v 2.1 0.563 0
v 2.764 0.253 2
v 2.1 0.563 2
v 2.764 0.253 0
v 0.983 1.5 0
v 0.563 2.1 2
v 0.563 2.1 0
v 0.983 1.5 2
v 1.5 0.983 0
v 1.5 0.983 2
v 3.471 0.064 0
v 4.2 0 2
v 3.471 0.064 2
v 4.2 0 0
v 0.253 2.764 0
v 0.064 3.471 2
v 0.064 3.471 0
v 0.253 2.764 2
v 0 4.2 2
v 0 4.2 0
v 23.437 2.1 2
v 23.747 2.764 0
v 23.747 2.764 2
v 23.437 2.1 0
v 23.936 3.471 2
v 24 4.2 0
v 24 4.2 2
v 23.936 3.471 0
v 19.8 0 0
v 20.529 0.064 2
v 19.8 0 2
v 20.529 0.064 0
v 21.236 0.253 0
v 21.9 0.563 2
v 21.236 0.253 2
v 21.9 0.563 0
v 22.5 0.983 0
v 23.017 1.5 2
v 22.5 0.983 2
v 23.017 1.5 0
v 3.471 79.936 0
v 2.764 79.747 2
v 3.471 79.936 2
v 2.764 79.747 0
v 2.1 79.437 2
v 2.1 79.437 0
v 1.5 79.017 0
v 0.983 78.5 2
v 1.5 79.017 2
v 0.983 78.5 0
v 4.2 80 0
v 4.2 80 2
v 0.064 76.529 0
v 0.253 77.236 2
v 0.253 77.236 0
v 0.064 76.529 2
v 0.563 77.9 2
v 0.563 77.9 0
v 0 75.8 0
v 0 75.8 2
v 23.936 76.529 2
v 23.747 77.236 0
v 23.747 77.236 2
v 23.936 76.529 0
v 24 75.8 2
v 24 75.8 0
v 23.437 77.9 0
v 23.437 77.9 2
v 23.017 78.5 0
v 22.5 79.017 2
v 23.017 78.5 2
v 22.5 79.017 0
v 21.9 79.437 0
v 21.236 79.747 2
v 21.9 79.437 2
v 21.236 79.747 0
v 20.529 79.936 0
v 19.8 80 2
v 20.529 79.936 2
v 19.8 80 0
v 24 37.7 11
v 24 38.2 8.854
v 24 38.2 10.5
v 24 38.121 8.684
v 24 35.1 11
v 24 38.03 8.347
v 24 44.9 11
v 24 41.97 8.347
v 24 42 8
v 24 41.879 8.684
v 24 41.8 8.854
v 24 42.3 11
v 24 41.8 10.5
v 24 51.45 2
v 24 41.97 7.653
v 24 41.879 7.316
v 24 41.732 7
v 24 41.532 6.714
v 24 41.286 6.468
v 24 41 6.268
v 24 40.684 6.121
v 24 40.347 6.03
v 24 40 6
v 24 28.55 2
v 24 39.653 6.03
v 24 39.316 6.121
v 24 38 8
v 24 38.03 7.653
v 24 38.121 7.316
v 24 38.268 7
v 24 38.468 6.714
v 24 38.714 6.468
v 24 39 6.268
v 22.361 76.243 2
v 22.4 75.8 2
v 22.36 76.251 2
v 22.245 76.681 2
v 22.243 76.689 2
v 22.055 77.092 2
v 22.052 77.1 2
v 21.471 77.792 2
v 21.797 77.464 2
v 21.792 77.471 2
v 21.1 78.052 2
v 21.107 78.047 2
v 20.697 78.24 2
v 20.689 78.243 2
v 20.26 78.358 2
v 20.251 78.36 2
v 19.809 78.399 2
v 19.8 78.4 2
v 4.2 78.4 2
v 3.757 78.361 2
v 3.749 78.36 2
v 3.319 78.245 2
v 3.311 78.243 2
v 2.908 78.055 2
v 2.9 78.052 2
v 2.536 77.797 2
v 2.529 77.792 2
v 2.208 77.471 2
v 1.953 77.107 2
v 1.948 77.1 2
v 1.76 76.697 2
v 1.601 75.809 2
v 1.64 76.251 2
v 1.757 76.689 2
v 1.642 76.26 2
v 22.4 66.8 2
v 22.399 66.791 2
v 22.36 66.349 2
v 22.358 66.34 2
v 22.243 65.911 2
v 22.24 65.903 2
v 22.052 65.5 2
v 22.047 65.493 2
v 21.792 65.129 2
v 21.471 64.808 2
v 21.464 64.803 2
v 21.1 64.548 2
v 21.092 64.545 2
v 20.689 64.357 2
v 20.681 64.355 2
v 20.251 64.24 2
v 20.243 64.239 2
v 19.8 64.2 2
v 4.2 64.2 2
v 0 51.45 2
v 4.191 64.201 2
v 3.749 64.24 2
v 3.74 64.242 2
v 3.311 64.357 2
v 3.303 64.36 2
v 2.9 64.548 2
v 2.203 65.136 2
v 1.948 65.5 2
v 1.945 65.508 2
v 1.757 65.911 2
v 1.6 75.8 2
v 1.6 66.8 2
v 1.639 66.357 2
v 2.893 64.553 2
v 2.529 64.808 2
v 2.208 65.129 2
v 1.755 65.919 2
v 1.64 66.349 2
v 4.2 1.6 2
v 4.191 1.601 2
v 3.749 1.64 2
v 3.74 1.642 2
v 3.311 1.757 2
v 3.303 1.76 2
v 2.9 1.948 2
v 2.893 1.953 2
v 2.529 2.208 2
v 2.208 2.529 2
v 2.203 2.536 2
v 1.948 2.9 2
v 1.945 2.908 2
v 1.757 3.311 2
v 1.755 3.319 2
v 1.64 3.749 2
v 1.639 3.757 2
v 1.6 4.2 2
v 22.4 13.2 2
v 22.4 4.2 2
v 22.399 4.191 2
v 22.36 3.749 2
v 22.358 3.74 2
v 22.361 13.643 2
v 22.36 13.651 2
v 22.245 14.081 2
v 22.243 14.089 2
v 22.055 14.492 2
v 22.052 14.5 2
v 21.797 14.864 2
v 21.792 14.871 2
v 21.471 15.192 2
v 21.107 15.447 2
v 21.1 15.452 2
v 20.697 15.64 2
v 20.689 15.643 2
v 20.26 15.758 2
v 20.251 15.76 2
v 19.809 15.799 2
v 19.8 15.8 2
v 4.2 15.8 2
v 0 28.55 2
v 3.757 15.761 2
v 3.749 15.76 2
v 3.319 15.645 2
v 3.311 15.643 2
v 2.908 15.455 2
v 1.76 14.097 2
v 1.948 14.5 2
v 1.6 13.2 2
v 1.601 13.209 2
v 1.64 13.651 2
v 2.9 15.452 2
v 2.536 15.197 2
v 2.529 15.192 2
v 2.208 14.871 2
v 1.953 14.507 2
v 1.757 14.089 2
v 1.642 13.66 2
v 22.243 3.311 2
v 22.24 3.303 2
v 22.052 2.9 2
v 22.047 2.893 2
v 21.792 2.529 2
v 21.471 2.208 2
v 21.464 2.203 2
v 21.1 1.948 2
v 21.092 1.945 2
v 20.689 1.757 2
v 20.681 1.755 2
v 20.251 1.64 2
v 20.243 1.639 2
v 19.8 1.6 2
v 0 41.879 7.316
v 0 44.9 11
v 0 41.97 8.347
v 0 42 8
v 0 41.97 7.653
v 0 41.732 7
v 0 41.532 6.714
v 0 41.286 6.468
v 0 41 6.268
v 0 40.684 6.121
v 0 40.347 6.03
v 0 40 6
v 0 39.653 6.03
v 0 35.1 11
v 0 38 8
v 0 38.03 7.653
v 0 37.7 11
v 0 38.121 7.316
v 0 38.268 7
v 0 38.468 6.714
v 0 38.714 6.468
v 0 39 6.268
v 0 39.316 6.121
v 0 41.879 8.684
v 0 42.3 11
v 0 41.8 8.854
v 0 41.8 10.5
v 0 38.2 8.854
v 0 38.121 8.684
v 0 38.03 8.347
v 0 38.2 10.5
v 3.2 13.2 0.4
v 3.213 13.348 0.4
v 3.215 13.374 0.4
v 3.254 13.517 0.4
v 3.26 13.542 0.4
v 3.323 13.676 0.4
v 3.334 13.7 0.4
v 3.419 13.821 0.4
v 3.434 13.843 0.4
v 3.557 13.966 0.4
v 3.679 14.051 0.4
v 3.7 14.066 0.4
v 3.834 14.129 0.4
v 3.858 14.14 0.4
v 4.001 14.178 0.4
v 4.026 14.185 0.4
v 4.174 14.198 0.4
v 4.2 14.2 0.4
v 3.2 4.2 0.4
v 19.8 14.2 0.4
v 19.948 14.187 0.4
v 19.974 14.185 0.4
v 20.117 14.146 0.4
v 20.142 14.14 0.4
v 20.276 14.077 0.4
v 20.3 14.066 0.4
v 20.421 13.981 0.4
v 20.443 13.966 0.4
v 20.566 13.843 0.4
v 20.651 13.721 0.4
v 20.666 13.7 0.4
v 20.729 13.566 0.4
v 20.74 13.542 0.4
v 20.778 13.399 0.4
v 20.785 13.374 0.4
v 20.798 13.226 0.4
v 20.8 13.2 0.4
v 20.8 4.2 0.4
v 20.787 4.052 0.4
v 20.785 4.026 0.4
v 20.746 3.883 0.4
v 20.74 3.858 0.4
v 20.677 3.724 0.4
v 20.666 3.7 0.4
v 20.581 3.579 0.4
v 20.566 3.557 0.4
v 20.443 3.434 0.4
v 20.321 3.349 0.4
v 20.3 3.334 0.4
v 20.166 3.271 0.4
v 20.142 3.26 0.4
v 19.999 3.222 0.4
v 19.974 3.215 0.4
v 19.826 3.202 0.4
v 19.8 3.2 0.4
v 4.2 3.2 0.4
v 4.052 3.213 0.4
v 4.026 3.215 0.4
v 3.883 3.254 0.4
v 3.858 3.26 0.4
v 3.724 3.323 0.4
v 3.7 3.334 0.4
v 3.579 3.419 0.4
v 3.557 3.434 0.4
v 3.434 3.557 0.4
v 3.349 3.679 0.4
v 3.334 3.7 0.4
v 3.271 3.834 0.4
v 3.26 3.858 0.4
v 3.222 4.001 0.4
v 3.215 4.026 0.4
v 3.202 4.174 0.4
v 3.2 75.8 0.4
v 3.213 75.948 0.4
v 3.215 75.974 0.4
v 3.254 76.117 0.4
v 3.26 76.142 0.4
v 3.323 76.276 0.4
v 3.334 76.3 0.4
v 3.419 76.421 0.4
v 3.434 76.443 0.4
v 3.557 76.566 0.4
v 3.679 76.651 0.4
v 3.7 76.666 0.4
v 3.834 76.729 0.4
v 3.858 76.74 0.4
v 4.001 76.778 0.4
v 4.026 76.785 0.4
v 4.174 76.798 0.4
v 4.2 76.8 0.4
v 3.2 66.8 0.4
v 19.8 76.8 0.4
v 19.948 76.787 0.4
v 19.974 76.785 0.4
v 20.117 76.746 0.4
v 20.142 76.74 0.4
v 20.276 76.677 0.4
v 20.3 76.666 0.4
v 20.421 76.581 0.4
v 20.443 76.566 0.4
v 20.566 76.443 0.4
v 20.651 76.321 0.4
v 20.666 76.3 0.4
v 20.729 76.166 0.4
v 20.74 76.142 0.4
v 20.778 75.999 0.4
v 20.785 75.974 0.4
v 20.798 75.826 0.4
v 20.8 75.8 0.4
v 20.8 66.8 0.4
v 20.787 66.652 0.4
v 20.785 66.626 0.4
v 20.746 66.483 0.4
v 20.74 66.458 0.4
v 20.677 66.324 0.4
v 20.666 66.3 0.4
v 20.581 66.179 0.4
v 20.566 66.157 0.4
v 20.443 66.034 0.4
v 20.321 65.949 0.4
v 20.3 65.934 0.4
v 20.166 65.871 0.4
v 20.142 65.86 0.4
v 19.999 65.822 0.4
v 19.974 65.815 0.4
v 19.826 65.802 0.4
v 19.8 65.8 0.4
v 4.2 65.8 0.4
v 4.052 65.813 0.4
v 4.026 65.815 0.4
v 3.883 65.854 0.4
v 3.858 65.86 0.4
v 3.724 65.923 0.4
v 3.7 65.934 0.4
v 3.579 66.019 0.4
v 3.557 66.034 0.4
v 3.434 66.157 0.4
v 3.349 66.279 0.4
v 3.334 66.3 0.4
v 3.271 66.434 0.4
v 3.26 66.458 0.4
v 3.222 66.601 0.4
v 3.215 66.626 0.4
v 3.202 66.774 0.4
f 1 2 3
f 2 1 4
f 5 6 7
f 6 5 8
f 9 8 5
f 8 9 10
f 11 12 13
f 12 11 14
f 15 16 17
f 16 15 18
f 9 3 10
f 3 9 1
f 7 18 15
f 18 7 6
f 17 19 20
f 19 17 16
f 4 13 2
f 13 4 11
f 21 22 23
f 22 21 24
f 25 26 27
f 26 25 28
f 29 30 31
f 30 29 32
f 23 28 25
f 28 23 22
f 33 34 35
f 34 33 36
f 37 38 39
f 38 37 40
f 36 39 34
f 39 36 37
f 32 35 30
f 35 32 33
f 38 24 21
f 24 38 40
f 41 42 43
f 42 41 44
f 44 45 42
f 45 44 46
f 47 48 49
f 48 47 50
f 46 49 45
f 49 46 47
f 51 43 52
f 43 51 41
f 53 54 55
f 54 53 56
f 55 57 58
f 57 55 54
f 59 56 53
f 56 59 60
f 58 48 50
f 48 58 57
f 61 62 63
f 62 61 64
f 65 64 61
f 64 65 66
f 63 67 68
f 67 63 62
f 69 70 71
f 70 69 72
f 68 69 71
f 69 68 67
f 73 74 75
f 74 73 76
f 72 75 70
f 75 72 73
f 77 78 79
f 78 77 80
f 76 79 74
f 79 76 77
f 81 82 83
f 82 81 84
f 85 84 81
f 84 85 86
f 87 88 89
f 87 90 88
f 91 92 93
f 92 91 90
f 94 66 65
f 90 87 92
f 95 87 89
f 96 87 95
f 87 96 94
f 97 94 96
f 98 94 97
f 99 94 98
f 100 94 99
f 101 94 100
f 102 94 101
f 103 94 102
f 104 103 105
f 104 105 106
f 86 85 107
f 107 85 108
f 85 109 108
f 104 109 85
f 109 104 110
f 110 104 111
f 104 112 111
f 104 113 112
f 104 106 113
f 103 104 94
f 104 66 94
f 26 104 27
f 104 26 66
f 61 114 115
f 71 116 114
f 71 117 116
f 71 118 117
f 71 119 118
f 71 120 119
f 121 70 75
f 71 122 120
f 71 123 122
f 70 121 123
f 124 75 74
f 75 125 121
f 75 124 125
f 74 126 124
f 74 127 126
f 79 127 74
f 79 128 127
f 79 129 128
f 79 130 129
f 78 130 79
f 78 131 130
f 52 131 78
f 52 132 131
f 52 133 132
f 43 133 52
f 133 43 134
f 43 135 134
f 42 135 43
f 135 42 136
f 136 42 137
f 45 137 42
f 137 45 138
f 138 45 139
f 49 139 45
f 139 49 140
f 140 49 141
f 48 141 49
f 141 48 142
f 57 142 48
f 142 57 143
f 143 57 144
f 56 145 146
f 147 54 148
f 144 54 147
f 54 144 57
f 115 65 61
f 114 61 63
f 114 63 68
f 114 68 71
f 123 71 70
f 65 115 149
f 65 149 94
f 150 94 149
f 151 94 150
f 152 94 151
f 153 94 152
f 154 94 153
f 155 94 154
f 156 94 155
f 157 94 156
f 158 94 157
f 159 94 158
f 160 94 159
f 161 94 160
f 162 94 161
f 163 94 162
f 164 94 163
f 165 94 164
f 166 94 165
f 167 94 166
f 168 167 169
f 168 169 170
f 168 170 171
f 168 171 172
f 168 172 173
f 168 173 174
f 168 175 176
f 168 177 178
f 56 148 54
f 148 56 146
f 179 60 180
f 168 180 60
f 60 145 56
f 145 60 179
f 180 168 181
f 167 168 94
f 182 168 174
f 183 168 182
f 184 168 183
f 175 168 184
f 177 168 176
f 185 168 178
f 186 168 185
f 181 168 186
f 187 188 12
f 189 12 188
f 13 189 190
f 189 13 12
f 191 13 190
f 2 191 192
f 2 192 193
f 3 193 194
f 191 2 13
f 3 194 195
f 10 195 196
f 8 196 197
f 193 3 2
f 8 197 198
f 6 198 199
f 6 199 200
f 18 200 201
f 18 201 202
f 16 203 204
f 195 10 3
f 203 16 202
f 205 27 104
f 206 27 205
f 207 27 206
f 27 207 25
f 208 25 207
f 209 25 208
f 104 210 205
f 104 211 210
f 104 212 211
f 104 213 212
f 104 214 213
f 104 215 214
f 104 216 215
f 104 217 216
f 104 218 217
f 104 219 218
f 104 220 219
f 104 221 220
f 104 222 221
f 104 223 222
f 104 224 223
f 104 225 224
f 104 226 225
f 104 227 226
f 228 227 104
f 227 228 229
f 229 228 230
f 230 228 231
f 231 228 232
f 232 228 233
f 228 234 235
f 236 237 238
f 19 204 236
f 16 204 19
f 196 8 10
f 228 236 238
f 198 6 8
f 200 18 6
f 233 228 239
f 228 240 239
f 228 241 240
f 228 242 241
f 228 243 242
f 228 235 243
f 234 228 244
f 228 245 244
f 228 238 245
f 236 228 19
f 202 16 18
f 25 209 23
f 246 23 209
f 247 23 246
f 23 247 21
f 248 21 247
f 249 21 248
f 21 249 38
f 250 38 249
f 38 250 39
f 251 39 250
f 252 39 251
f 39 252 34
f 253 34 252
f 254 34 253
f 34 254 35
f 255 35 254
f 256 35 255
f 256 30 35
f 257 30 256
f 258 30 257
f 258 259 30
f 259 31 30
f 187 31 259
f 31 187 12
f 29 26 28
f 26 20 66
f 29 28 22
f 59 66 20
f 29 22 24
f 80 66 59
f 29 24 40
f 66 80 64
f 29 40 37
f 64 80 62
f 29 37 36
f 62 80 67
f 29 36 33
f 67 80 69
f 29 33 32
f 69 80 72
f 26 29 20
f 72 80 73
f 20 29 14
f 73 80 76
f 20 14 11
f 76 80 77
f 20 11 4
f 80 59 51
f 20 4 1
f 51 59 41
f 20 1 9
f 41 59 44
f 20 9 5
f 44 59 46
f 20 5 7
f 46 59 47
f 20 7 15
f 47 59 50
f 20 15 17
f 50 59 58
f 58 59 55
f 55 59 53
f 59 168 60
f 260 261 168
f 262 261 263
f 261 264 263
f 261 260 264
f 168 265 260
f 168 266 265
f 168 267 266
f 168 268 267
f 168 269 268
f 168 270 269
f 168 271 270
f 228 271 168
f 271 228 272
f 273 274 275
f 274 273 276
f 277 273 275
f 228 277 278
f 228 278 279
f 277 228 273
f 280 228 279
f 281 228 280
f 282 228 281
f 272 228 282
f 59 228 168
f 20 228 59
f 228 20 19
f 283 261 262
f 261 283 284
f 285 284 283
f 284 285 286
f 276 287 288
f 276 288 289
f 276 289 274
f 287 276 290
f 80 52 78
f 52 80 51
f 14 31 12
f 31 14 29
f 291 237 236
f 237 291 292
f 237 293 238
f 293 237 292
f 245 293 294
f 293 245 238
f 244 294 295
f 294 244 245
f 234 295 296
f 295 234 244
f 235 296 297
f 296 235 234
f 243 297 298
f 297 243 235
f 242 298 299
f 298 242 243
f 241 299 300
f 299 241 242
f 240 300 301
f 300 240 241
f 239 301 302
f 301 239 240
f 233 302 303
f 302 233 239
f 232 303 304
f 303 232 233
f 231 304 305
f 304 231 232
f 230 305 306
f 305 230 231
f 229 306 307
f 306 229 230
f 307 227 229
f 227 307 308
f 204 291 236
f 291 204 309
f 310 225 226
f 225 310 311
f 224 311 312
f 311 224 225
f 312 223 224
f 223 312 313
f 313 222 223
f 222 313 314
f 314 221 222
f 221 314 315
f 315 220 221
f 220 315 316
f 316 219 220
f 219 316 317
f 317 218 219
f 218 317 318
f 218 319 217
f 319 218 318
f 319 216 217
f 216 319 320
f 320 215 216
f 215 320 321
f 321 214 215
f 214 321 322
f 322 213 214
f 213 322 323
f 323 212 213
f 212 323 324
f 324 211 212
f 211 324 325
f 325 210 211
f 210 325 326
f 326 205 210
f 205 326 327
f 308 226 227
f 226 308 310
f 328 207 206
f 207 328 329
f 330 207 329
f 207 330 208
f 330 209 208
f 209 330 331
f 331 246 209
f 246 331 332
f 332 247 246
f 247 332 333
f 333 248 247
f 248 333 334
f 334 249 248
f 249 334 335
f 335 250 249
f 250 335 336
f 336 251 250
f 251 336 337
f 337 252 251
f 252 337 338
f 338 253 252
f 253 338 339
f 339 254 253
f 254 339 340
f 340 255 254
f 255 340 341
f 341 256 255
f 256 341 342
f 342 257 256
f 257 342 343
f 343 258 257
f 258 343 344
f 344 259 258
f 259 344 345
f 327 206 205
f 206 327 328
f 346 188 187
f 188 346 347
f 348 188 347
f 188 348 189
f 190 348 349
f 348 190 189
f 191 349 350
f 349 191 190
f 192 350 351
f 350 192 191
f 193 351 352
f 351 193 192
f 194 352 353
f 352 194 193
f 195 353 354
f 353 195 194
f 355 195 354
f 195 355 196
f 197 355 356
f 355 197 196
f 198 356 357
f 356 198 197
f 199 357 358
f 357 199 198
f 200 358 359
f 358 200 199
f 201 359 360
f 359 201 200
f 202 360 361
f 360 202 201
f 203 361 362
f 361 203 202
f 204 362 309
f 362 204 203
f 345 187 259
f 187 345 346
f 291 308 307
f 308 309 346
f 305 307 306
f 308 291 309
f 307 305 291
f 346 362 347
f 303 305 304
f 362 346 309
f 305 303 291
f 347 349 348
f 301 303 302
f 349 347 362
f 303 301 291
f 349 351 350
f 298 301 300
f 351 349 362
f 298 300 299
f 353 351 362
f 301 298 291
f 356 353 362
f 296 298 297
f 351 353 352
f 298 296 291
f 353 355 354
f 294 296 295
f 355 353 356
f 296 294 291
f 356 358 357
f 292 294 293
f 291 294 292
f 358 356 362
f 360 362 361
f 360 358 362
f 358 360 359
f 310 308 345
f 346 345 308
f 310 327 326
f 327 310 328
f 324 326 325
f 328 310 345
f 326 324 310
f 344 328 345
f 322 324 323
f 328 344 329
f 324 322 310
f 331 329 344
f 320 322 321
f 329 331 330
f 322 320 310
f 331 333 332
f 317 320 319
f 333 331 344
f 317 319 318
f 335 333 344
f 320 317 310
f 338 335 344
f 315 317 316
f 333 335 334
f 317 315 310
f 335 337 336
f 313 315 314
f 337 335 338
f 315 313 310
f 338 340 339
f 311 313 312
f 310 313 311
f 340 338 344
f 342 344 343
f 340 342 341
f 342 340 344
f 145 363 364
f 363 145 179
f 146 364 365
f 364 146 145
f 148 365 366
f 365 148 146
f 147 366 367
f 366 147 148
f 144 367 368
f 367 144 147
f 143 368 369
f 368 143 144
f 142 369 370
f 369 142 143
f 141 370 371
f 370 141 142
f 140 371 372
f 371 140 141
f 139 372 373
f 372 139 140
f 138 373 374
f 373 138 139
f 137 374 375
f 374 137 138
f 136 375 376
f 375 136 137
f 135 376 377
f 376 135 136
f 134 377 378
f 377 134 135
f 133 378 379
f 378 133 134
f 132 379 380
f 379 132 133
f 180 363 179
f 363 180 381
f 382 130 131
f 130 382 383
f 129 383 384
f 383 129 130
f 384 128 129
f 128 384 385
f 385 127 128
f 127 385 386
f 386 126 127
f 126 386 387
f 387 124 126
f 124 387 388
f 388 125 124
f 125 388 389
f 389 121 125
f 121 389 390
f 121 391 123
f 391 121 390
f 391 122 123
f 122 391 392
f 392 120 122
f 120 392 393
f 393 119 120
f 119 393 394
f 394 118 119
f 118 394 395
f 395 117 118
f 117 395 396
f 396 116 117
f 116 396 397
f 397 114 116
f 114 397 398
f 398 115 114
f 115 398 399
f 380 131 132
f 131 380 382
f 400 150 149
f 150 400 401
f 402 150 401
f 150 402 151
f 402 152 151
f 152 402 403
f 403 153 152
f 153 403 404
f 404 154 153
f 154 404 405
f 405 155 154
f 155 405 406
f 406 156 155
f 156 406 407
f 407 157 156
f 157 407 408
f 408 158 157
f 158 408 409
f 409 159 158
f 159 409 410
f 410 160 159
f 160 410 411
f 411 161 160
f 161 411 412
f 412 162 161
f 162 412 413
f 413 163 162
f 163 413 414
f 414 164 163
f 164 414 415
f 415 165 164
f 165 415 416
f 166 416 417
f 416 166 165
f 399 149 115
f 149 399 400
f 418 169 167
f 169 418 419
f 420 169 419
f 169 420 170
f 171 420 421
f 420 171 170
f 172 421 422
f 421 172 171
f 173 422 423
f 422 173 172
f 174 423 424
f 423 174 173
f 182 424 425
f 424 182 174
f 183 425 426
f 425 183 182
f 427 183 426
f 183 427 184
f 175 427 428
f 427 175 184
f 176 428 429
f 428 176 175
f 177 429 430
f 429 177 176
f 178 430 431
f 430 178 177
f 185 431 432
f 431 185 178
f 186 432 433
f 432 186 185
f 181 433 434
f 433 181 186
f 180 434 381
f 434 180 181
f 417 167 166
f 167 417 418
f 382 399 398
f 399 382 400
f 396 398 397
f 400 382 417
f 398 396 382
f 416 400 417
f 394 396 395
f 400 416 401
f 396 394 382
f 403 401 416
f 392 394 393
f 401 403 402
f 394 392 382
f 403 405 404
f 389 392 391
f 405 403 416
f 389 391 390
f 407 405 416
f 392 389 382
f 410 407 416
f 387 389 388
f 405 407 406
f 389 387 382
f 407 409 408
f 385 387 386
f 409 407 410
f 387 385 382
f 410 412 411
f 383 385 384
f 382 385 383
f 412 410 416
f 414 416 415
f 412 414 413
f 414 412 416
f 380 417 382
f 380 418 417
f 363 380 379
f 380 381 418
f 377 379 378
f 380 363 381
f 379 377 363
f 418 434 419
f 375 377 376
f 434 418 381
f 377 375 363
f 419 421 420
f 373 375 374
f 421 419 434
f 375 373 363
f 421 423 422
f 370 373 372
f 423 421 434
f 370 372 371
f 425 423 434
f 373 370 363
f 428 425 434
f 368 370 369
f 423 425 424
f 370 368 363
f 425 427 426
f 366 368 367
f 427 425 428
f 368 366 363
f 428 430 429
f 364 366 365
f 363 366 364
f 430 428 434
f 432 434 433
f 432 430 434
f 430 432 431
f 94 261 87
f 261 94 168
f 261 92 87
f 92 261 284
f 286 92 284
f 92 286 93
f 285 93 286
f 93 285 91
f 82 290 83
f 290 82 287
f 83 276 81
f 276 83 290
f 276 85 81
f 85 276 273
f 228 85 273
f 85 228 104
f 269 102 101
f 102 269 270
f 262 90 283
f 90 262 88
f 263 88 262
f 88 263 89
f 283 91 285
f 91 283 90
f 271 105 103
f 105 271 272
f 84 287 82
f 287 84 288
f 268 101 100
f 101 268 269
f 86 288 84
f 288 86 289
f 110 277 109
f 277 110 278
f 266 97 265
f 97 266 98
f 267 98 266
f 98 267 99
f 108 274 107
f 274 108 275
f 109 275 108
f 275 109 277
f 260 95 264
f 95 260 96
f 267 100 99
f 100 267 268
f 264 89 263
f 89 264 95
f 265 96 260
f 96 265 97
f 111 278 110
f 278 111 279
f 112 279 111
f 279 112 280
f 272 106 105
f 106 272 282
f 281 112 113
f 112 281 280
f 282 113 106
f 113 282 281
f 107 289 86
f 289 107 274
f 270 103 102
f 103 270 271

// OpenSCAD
// preview[view:east, tilt:top diagonal]

/*[Parameters]*/

wire_diameter = 3.8;	//[2.0:2.0mm,2.1:2.1mm,2.2:2.2mm,2.3:2.3mm,2.4:2.4mm,2.5:2.5mm,2.6:2.6mm,2.7:2.7mm,2.8:2.8mm,2.9:2.9mm,3.0:3.0mm,3.1:3.1mm,3.2:3.2mm,3.3:3.3mm,3.4:3.4mm,3.5:3.5mm,3.6:3.6mm,3.7:3.7mm,3.8:3.8mm,3.9:3.9mm,4.0:4.0mm,4.1:4.1mm,4.2:4.2mm,4.3:4.3mm,4.4:4.4mm,4.5:4.5mm,4.6:4.6mm,4.7:4.7mm,4.8:4.8mm,4.9:4.9mm,5.0:5.0mm]
clearance = 0.1;	//[0.1:0.1mm,0.2:0.2mm,0.3:0.3mm,0.4:0.4mm]
panel_offset = 6;	//[3:3mm,4:4mm,5:5mm,6:6mm,7:7mm,8:8mm,9:9mm,10:10mm]
testprint = 0;	//[0:None,1:For Test Print]
quantity = 1;	//[1:1,2:2,3:3,4:4,5:5,6:6]

/*[Hidden]*/

module mesh_panel_wall_mount(wire_diameter,clearance,panel_offset,testprint,quantity)
{
	module rounded_cube(x,y,z,r,top_chamfer,bottom_chamfer) {
		difference(){
			cube([x,y,z]);
			if ( r > 0 ) {
				for ( tr=[[[-adj,-adj,-adj],[r,r,-adj]],[[x-r,-adj,-adj],[x-r,r,-adj]],[[-adj,y-r,-adj],[r,y-r,-adj]],[[x-r,y-r,-adj],[x-r,y-r,-adj]]] ) {
					difference(){
						translate(tr[0]) cube([r+adj,r+adj,z+adj*2]);
						translate(tr[1]) cylinder(r=r,h=z+adj*2,$fn=fn);
					}
				}
			}

			if ( top_chamfer > 0 ) {
				for ( tr=[[[0,r,0],[0,0,0],y],[[r,y,0],[0,0,-90],x],[[x,y-r,0],[0,0,-180],y],[[x-r,0,0],[0,0,-270],x]] ) {
					translate(tr[0]) {
						rotate(tr[1]) {
							translate([0,-adj,z]) {
								rotate([-90,0,0]) {
									linear_extrude(height=tr[2]-r*2+adj*2,center=false,convex=10) {
										polygon(points=[[-adj,-adj],[top_chamfer+adj,-adj],[-adj,top_chamfer+adj]]);
									}
								}
							}
							translate([r,tr[2]-r*2,z]) {
								intersection() {
									rotate_extrude($fn=fn) {
										translate([-r,0,0]) {
											polygon(points=[[-adj,adj],[top_chamfer+adj,adj],[-adj,-top_chamfer-adj]]);
										}
									};
									translate([-r-adj,0,-top_chamfer-adj]) {
										cube([r+adj,r+adj,top_chamfer+adj*2]);
									}
								}
							}
						}
					}
				}
			}


			if ( bottom_chamfer > 0 ) {
				for ( tr=[[[0,r,0],[0,0,0],y],[[r,y,0],[0,0,-90],x],[[x,y-r,0],[0,0,-180],y],[[x-r,0,0],[0,0,-270],x]] ) {
					translate(tr[0]) {
						rotate(tr[1]) {
							translate([0,-adj,0]) {
								rotate([-90,0,0]) {
									linear_extrude(height=tr[2]-r*2+adj*2,center=false,convex=10) {
										polygon(points=[[-adj,adj],[bottom_chamfer+adj,adj],[-adj,-bottom_chamfer-adj]]);
									}
								}
							}
							translate([r,tr[2]-r*2,0]) {
								intersection() {
									rotate_extrude($fn=fn) {
										translate([-r,0,0]) {
											polygon(points=[[-adj,-adj],[bottom_chamfer+adj,-adj],[-adj,bottom_chamfer+adj]]);
										}
									};
									translate([-r-adj,0,-adj]) {
										cube([r+adj,r+adj,bottom_chamfer+adj*2]);
									}
								}
							}
						}
					}
				}
			}


		}
	}

	fn=36;
	width=24;
	depth=80;
	height=2.0;
	staple_thickness=0.4;
	staple_width=11;
	bezel_width=3.2;
	outer_round=4.2;
	adj=0.1;

	offset=panel_offset-height;
	dia1=wire_diameter+clearance*2;	//3.8,0.1 -> 4.0  3.8,0.2 -> 4.2
	dia2=wire_diameter-0.4+clearance*2;	//3.8,0.1 -> 3.6  3.8,0.2 -> 3.8

	l1=1.0;
	l2=6.0+wire_diameter;
	slot_chamfer=0.5;

	mount_height=offset+dia1+l1;
	mount_width=mount_height*2+l2/2;

	for ( q = [0:quantity-1] ) {
		translate([q*(width+1.0),0,0]) {
			intersection() {
				union() {
					difference(){
						rounded_cube(width,depth,height,outer_round);

						translate([
							bezel_width-(height-staple_thickness)
							,bezel_width-(height-staple_thickness)
							,staple_thickness]
						)
							rounded_cube(
								width-bezel_width*2+(height-staple_thickness)*2
								,staple_width+(height-staple_thickness)*2
								,height-staple_thickness+adj
								,outer_round-bezel_width+(height-staple_thickness)
								,0
								,(height-staple_thickness)
							);

						translate([
							bezel_width-(height-staple_thickness)
							,depth-bezel_width-staple_width-(height-staple_thickness)
							,staple_thickness
						])
							rounded_cube(
								width-bezel_width*2+(height-staple_thickness)*2
								,staple_width+(height-staple_thickness)*2
								,height-staple_thickness+adj
								,outer_round-bezel_width+(height-staple_thickness)
								,0
								,(height-staple_thickness)
							);
					}

					translate([0,depth/2,height]) {
						rotate([90,0,90]) {
							difference() {
								linear_extrude(height=width,center=false,convex=10) {
									polygon(points=[
										[-mount_width/2,-adj]
										,[-mount_width/2,0]
										,[-l2/2,mount_height]
										,[-dia2/2-slot_chamfer,mount_height]
										,[-dia2/2,mount_height-slot_chamfer]
										,[-dia2/2,mount_height-l1-dia1/2]
										,[dia2/2,mount_height-l1-dia1/2]
										,[dia2/2,mount_height-slot_chamfer]
										,[dia2/2+slot_chamfer,mount_height]
										,[l2/2,mount_height]
										,[mount_width/2,0]
										,[mount_width/2,-adj]
									]);
								}
								translate([0,offset+dia1/2,-adj]) {
									cylinder(r=dia1/2,h=width+adj*2,$fn=fn);
								}

							}
						}
					}
				}

				if ( testprint==0 ) {
					translate([-adj,-adj,-adj])
						cube([width+adj*2,depth+adj*2,height+mount_height+adj*2]);
				} else {
					translate([-adj,mount_width/2,height+adj])
						cube([width+adj*2,depth-mount_width,mount_height+adj*2]);
				}
			}
		}
	}

}

mesh_panel_wall_mount(wire_diameter,clearance,panel_offset,testprint,quantity);
